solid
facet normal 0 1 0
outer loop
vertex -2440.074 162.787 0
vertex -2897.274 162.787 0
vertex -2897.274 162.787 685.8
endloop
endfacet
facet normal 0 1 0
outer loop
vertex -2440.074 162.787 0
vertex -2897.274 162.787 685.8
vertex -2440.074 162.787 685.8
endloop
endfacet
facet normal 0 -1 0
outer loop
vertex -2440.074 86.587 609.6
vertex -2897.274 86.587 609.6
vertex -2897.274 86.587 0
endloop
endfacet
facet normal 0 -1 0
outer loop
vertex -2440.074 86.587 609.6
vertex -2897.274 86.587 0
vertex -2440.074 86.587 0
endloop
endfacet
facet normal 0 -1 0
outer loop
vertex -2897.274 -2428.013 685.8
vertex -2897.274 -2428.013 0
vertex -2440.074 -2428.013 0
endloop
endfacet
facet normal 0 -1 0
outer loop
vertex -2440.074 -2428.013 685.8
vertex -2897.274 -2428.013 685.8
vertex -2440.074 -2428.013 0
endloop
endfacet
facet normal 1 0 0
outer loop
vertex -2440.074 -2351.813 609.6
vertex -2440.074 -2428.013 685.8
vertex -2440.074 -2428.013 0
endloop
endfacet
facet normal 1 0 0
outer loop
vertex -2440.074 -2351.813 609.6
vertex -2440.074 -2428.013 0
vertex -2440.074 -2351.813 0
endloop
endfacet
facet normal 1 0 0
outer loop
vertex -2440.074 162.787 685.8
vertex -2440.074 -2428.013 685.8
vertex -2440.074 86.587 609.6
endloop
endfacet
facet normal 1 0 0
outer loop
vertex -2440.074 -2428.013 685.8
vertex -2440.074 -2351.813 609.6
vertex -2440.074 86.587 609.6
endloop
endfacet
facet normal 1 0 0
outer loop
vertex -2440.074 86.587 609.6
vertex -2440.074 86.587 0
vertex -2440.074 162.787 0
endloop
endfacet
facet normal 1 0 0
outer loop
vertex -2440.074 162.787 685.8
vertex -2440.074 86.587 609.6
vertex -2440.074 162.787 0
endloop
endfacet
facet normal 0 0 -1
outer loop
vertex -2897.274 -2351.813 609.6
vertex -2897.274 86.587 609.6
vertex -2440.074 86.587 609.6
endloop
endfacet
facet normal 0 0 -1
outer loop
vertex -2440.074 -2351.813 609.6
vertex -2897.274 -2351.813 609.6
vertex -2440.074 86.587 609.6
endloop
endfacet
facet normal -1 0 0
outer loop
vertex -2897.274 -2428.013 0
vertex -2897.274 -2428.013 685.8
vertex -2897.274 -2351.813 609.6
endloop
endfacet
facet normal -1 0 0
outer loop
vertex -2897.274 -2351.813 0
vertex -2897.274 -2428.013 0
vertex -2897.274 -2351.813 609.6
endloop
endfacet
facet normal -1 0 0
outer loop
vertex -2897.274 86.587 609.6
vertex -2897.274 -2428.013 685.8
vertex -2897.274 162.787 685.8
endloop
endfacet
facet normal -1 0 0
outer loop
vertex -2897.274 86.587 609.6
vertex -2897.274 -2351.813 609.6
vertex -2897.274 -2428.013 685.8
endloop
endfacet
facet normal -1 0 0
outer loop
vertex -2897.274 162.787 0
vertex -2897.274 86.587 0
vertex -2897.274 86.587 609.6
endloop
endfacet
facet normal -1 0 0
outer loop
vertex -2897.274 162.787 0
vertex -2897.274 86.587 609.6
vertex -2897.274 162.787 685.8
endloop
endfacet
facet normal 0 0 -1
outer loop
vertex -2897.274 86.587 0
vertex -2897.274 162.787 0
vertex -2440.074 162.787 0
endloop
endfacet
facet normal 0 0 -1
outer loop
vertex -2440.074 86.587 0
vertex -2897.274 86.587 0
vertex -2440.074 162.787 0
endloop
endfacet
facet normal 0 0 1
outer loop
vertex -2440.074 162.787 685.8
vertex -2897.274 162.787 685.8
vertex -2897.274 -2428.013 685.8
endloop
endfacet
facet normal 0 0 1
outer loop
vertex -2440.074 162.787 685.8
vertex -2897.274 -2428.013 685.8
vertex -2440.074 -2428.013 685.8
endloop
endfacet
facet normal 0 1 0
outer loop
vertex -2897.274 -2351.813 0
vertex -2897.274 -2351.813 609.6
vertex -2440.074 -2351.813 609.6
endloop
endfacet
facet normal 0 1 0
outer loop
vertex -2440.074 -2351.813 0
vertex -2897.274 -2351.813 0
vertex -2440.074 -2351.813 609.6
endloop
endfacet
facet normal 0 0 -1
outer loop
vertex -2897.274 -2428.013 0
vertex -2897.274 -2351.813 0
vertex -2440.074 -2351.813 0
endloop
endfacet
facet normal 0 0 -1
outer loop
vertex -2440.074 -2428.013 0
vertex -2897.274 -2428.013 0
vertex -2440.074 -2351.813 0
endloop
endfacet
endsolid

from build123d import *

# Parameters (mm, degrees)
F0_W     = 457.2
F0_H     = 2438.4
F1_DEPTH = 609.6
F2_T     = 76.2


with BuildPart() as f1:
    # F0 (on Top) → F1 (new body)
    with BuildSketch(Plane.XY):
        with Locations((-2668.6739219427, -1132.6131924457)):
            Rectangle(F0_W, F0_H)
    extrude(amount=F1_DEPTH)

    # F2
    f2_openings = [f1.faces().sort_by_distance(p)[0] for p in [
        (-2440.073922, -1132.613192, 304.8),
        (-2897.273922, -1132.613192, 304.8),
        (-2668.673922, -1132.613192, 0),
    ]]
    offset(amount=F2_T, openings=f2_openings, kind=Kind.INTERSECTION)


solid = f1.part
